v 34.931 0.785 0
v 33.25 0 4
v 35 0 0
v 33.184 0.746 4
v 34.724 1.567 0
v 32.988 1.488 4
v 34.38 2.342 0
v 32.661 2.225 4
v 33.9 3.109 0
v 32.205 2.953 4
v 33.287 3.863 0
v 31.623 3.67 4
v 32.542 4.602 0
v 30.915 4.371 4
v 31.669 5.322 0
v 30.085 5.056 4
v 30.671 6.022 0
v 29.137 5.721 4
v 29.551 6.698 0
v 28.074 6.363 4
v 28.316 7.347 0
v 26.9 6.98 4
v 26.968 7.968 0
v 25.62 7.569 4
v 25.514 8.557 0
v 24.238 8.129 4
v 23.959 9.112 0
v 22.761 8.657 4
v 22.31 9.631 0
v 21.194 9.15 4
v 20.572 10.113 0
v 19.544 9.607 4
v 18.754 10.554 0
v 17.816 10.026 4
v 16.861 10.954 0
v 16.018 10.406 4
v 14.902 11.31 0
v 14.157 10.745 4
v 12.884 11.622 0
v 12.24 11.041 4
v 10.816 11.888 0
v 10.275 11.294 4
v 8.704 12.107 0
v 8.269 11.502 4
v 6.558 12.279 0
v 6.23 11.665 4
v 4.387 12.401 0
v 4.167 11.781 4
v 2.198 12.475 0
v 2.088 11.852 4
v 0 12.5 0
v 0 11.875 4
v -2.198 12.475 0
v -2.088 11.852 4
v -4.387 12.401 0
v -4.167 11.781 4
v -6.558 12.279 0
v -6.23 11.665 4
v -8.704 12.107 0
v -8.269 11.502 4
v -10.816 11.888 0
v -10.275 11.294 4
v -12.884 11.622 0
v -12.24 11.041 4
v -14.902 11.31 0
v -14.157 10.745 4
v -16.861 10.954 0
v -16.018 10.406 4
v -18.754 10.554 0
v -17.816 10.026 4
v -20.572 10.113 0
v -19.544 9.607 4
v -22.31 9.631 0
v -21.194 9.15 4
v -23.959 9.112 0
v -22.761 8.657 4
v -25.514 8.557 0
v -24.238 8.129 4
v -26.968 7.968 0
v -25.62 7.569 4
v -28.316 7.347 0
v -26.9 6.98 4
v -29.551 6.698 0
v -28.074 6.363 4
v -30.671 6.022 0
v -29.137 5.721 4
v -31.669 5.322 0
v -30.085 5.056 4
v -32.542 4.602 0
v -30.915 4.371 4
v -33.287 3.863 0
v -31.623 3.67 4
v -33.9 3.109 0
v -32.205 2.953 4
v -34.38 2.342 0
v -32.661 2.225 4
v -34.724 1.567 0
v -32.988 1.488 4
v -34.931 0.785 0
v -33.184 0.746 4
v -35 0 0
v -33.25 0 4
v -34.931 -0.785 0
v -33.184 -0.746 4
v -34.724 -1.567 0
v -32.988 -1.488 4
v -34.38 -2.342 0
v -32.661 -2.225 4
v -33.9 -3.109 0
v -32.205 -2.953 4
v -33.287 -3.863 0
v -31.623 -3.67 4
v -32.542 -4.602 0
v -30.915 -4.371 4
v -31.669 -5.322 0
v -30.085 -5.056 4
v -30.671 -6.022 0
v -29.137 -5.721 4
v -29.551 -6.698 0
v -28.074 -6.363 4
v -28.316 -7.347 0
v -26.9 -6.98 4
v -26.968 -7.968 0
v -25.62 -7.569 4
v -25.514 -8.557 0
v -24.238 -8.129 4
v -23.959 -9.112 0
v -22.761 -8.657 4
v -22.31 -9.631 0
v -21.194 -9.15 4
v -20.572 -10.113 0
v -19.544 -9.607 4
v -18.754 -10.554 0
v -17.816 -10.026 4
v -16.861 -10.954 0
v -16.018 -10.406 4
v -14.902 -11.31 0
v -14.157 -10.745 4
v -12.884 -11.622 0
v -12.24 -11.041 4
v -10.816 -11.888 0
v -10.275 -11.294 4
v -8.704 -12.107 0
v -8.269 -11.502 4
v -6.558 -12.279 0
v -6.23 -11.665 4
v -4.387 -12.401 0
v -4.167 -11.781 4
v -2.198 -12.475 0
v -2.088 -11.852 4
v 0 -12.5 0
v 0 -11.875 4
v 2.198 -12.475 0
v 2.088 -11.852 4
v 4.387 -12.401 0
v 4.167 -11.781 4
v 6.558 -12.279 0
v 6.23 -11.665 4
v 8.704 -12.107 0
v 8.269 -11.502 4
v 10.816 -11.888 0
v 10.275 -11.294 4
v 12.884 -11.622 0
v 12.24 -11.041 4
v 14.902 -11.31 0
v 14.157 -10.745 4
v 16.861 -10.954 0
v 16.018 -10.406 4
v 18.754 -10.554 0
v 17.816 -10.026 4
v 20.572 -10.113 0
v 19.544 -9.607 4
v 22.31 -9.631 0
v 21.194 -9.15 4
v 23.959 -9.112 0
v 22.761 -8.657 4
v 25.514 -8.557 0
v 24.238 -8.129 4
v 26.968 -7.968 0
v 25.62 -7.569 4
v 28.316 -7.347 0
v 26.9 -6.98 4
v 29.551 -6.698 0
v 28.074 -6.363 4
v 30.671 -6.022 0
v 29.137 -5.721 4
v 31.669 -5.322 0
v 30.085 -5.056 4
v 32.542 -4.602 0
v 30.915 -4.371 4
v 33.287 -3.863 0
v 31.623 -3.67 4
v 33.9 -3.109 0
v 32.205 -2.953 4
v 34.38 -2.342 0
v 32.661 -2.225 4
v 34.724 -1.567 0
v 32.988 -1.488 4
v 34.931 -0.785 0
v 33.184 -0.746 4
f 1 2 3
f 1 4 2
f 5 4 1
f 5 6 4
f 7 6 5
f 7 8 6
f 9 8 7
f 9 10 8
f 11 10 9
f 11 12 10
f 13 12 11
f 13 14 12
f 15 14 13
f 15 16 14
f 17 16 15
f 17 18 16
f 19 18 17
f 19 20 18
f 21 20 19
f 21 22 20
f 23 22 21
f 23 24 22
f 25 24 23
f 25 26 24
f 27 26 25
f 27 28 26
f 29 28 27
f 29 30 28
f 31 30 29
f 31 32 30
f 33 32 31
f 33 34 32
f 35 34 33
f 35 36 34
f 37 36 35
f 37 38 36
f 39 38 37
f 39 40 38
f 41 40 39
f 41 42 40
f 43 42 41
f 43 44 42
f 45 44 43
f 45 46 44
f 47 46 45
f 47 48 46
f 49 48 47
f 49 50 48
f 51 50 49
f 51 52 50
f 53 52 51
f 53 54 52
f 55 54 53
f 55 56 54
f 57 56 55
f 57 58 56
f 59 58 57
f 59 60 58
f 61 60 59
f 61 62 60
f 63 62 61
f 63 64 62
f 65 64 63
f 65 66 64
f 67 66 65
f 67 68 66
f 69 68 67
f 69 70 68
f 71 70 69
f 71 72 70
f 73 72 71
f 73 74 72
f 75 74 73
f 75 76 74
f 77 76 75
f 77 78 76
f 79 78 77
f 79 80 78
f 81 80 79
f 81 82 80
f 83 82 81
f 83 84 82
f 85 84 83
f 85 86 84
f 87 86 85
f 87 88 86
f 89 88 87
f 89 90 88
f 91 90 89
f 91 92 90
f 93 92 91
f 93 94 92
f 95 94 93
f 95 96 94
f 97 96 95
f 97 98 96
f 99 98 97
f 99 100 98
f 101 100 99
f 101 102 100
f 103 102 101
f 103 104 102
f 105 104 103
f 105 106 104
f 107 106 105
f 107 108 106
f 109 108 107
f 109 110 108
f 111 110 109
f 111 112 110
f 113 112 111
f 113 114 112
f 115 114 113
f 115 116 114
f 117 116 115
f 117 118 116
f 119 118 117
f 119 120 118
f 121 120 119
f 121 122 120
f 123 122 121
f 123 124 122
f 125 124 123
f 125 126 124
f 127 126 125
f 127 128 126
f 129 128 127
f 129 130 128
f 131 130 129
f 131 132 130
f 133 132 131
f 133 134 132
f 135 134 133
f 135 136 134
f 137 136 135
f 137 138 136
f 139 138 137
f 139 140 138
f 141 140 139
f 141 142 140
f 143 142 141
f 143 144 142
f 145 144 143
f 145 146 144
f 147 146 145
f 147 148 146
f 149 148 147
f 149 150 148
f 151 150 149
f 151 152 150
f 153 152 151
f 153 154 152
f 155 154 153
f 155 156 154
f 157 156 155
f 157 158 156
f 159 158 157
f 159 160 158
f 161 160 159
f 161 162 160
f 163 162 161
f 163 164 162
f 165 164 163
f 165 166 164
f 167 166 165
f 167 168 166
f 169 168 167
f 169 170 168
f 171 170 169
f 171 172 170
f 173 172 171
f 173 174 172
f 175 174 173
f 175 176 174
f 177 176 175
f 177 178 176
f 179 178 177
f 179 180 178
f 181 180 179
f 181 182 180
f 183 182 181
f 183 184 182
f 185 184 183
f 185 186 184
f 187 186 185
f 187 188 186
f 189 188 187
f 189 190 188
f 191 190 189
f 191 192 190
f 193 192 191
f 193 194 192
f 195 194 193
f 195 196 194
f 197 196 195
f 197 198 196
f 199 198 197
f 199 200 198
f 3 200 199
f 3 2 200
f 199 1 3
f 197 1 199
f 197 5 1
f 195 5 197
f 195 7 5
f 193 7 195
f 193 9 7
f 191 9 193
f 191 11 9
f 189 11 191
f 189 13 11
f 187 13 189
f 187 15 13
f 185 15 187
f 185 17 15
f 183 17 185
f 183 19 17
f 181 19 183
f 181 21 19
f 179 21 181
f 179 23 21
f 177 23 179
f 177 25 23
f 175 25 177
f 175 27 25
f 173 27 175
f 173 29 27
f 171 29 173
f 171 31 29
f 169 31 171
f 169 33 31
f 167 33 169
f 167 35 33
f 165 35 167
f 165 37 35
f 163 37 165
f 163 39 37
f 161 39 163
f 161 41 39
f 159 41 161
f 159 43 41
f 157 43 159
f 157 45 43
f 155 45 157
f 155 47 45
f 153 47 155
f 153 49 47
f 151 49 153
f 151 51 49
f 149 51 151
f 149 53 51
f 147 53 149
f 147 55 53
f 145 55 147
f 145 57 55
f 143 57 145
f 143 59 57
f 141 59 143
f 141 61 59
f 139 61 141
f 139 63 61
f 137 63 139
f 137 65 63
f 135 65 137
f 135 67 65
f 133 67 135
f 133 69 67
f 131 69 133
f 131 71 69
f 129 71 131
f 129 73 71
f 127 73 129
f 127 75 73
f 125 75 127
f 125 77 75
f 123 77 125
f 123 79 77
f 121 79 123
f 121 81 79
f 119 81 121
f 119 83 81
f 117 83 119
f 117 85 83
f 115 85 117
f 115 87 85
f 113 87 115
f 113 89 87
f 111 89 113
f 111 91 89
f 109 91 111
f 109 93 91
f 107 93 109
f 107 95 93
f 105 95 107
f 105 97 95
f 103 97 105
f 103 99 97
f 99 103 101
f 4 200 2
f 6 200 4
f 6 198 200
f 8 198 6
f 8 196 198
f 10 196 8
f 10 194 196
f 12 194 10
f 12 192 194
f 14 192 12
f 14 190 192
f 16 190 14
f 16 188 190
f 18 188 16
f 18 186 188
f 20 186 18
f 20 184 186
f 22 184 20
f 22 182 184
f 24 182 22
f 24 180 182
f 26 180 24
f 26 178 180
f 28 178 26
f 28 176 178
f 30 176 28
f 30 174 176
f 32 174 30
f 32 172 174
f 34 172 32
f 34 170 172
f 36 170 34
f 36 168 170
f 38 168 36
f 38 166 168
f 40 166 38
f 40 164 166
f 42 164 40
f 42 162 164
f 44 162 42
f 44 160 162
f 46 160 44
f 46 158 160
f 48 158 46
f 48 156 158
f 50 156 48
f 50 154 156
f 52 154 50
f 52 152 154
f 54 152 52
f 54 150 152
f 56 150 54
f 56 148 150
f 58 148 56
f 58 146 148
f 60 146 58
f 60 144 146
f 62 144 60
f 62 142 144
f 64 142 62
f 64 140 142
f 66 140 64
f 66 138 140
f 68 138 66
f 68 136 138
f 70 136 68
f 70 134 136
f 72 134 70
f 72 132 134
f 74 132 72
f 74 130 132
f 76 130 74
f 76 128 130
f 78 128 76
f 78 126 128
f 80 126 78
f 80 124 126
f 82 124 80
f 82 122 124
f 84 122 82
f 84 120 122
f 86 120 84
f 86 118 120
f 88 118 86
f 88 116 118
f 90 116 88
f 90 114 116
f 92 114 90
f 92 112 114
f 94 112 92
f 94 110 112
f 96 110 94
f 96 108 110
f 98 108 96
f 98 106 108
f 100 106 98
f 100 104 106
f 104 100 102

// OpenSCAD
// file: ../build.scad
$build_id = "";

function building(filename) = is_undef(filename) ?
  !is_undef(build)
  : !is_undef(build) && build == filename;

function previewing() = !building();

module build(filename) {
  $build_id = filename;

  if(!is_undef(scad_build_scan) && scad_build_scan == true) {
    echo(str("scad_build_scan: ", filename));
  }
  else if(previewing() || build == filename) {
    children();
  }
}

module preview_row(spacing) {
  if(previewing()) {
    for(x = [0:1:$children - 1]) {
      translate([x * spacing, 0, 0]) {
        children(x);
      }
    }
  }
  else {
    children();
  }
}

module preview_column(spacing) {
  if(previewing()) {
    for(y = [0:1:$children - 1]) {
      translate([0, y * spacing, 0]) {
        children(y);
      }
    }
  }
  else {
    children();
  }
}
// file: ../minibase.scad
// Based off of titancraft's Customizable Miniature Base (CC0 1.0)
// https://www.thingiverse.com/thing:1112237

include <./build.scad>

$base_rim = 1; //	[1: tapered, 2: inclined, 3: flat]
// Number of sides:
$base_shape = 100; //	[30:Low-res Circle, 100: Hi-res Circle, 5:Pentagon, 6:Hexagon, 8:Octagon, 4:Square, 3:Triangle]

$base_diameter = 32;
$base_height = 4;
$base_slant = 95;

// Percentage:
$base_stretch = 100;

//(tapered base only)
$base_inner_circle_ratio = 40;

module tapered(r=40) {
  $base_rim = 1;
  $base_inner_circle_ratio = r;

  children();
}

module inclined() {
  $base_rim = 2;

  children();
}

module flat() {
  $base_rim = 3;

  children();
}

module shape(s) {
  $base_shape = s;

  children();
}

module diameter(d) {
  $base_diameter = d;

  children();
}

module height(h) {
  $base_height = h;

  children();
}

module slant(s) {
  $base_slant = s;

  children();
}

module stretch(s) {
  $base_stretch = s;

  children();
}

module base(id) {
  build(id) union() {
    radius = $base_diameter/2;
    scale([$base_stretch/100, 1, 1]){
      if ($base_rim == 1){
        // tapered base
        cyl1_height = $base_height * (1-$base_inner_circle_ratio/100);
        cylinder(cyl1_height, radius, radius * $base_slant/100, $fn=$base_shape);

        cyl2_radius = radius  * $base_slant/100 * .95;
        cyl2_height = $base_height - cyl1_height;

        translate([0, 0, cyl1_height]){
          cylinder(cyl2_height, cyl2_radius, cyl2_radius * $base_slant/100, $fn=$base_shape);
          cylinder(cyl2_height*.5, radius * $base_slant/100, cyl2_radius, $fn=$base_shape);
        }
      } else if ($base_rim == 2){
        // inclined base
        cylinder($base_height, radius, radius * $base_slant/100, $fn=$base_shape);
      } else if ($base_rim == 3){
        // flat base

        cylinder($base_height, radius, radius, $fn=$base_shape);
      }
    }
  }
}
// main file
include <../minibase.scad>

inclined() diameter(25) stretch(280) base("25x70mm-opr-bikes");
